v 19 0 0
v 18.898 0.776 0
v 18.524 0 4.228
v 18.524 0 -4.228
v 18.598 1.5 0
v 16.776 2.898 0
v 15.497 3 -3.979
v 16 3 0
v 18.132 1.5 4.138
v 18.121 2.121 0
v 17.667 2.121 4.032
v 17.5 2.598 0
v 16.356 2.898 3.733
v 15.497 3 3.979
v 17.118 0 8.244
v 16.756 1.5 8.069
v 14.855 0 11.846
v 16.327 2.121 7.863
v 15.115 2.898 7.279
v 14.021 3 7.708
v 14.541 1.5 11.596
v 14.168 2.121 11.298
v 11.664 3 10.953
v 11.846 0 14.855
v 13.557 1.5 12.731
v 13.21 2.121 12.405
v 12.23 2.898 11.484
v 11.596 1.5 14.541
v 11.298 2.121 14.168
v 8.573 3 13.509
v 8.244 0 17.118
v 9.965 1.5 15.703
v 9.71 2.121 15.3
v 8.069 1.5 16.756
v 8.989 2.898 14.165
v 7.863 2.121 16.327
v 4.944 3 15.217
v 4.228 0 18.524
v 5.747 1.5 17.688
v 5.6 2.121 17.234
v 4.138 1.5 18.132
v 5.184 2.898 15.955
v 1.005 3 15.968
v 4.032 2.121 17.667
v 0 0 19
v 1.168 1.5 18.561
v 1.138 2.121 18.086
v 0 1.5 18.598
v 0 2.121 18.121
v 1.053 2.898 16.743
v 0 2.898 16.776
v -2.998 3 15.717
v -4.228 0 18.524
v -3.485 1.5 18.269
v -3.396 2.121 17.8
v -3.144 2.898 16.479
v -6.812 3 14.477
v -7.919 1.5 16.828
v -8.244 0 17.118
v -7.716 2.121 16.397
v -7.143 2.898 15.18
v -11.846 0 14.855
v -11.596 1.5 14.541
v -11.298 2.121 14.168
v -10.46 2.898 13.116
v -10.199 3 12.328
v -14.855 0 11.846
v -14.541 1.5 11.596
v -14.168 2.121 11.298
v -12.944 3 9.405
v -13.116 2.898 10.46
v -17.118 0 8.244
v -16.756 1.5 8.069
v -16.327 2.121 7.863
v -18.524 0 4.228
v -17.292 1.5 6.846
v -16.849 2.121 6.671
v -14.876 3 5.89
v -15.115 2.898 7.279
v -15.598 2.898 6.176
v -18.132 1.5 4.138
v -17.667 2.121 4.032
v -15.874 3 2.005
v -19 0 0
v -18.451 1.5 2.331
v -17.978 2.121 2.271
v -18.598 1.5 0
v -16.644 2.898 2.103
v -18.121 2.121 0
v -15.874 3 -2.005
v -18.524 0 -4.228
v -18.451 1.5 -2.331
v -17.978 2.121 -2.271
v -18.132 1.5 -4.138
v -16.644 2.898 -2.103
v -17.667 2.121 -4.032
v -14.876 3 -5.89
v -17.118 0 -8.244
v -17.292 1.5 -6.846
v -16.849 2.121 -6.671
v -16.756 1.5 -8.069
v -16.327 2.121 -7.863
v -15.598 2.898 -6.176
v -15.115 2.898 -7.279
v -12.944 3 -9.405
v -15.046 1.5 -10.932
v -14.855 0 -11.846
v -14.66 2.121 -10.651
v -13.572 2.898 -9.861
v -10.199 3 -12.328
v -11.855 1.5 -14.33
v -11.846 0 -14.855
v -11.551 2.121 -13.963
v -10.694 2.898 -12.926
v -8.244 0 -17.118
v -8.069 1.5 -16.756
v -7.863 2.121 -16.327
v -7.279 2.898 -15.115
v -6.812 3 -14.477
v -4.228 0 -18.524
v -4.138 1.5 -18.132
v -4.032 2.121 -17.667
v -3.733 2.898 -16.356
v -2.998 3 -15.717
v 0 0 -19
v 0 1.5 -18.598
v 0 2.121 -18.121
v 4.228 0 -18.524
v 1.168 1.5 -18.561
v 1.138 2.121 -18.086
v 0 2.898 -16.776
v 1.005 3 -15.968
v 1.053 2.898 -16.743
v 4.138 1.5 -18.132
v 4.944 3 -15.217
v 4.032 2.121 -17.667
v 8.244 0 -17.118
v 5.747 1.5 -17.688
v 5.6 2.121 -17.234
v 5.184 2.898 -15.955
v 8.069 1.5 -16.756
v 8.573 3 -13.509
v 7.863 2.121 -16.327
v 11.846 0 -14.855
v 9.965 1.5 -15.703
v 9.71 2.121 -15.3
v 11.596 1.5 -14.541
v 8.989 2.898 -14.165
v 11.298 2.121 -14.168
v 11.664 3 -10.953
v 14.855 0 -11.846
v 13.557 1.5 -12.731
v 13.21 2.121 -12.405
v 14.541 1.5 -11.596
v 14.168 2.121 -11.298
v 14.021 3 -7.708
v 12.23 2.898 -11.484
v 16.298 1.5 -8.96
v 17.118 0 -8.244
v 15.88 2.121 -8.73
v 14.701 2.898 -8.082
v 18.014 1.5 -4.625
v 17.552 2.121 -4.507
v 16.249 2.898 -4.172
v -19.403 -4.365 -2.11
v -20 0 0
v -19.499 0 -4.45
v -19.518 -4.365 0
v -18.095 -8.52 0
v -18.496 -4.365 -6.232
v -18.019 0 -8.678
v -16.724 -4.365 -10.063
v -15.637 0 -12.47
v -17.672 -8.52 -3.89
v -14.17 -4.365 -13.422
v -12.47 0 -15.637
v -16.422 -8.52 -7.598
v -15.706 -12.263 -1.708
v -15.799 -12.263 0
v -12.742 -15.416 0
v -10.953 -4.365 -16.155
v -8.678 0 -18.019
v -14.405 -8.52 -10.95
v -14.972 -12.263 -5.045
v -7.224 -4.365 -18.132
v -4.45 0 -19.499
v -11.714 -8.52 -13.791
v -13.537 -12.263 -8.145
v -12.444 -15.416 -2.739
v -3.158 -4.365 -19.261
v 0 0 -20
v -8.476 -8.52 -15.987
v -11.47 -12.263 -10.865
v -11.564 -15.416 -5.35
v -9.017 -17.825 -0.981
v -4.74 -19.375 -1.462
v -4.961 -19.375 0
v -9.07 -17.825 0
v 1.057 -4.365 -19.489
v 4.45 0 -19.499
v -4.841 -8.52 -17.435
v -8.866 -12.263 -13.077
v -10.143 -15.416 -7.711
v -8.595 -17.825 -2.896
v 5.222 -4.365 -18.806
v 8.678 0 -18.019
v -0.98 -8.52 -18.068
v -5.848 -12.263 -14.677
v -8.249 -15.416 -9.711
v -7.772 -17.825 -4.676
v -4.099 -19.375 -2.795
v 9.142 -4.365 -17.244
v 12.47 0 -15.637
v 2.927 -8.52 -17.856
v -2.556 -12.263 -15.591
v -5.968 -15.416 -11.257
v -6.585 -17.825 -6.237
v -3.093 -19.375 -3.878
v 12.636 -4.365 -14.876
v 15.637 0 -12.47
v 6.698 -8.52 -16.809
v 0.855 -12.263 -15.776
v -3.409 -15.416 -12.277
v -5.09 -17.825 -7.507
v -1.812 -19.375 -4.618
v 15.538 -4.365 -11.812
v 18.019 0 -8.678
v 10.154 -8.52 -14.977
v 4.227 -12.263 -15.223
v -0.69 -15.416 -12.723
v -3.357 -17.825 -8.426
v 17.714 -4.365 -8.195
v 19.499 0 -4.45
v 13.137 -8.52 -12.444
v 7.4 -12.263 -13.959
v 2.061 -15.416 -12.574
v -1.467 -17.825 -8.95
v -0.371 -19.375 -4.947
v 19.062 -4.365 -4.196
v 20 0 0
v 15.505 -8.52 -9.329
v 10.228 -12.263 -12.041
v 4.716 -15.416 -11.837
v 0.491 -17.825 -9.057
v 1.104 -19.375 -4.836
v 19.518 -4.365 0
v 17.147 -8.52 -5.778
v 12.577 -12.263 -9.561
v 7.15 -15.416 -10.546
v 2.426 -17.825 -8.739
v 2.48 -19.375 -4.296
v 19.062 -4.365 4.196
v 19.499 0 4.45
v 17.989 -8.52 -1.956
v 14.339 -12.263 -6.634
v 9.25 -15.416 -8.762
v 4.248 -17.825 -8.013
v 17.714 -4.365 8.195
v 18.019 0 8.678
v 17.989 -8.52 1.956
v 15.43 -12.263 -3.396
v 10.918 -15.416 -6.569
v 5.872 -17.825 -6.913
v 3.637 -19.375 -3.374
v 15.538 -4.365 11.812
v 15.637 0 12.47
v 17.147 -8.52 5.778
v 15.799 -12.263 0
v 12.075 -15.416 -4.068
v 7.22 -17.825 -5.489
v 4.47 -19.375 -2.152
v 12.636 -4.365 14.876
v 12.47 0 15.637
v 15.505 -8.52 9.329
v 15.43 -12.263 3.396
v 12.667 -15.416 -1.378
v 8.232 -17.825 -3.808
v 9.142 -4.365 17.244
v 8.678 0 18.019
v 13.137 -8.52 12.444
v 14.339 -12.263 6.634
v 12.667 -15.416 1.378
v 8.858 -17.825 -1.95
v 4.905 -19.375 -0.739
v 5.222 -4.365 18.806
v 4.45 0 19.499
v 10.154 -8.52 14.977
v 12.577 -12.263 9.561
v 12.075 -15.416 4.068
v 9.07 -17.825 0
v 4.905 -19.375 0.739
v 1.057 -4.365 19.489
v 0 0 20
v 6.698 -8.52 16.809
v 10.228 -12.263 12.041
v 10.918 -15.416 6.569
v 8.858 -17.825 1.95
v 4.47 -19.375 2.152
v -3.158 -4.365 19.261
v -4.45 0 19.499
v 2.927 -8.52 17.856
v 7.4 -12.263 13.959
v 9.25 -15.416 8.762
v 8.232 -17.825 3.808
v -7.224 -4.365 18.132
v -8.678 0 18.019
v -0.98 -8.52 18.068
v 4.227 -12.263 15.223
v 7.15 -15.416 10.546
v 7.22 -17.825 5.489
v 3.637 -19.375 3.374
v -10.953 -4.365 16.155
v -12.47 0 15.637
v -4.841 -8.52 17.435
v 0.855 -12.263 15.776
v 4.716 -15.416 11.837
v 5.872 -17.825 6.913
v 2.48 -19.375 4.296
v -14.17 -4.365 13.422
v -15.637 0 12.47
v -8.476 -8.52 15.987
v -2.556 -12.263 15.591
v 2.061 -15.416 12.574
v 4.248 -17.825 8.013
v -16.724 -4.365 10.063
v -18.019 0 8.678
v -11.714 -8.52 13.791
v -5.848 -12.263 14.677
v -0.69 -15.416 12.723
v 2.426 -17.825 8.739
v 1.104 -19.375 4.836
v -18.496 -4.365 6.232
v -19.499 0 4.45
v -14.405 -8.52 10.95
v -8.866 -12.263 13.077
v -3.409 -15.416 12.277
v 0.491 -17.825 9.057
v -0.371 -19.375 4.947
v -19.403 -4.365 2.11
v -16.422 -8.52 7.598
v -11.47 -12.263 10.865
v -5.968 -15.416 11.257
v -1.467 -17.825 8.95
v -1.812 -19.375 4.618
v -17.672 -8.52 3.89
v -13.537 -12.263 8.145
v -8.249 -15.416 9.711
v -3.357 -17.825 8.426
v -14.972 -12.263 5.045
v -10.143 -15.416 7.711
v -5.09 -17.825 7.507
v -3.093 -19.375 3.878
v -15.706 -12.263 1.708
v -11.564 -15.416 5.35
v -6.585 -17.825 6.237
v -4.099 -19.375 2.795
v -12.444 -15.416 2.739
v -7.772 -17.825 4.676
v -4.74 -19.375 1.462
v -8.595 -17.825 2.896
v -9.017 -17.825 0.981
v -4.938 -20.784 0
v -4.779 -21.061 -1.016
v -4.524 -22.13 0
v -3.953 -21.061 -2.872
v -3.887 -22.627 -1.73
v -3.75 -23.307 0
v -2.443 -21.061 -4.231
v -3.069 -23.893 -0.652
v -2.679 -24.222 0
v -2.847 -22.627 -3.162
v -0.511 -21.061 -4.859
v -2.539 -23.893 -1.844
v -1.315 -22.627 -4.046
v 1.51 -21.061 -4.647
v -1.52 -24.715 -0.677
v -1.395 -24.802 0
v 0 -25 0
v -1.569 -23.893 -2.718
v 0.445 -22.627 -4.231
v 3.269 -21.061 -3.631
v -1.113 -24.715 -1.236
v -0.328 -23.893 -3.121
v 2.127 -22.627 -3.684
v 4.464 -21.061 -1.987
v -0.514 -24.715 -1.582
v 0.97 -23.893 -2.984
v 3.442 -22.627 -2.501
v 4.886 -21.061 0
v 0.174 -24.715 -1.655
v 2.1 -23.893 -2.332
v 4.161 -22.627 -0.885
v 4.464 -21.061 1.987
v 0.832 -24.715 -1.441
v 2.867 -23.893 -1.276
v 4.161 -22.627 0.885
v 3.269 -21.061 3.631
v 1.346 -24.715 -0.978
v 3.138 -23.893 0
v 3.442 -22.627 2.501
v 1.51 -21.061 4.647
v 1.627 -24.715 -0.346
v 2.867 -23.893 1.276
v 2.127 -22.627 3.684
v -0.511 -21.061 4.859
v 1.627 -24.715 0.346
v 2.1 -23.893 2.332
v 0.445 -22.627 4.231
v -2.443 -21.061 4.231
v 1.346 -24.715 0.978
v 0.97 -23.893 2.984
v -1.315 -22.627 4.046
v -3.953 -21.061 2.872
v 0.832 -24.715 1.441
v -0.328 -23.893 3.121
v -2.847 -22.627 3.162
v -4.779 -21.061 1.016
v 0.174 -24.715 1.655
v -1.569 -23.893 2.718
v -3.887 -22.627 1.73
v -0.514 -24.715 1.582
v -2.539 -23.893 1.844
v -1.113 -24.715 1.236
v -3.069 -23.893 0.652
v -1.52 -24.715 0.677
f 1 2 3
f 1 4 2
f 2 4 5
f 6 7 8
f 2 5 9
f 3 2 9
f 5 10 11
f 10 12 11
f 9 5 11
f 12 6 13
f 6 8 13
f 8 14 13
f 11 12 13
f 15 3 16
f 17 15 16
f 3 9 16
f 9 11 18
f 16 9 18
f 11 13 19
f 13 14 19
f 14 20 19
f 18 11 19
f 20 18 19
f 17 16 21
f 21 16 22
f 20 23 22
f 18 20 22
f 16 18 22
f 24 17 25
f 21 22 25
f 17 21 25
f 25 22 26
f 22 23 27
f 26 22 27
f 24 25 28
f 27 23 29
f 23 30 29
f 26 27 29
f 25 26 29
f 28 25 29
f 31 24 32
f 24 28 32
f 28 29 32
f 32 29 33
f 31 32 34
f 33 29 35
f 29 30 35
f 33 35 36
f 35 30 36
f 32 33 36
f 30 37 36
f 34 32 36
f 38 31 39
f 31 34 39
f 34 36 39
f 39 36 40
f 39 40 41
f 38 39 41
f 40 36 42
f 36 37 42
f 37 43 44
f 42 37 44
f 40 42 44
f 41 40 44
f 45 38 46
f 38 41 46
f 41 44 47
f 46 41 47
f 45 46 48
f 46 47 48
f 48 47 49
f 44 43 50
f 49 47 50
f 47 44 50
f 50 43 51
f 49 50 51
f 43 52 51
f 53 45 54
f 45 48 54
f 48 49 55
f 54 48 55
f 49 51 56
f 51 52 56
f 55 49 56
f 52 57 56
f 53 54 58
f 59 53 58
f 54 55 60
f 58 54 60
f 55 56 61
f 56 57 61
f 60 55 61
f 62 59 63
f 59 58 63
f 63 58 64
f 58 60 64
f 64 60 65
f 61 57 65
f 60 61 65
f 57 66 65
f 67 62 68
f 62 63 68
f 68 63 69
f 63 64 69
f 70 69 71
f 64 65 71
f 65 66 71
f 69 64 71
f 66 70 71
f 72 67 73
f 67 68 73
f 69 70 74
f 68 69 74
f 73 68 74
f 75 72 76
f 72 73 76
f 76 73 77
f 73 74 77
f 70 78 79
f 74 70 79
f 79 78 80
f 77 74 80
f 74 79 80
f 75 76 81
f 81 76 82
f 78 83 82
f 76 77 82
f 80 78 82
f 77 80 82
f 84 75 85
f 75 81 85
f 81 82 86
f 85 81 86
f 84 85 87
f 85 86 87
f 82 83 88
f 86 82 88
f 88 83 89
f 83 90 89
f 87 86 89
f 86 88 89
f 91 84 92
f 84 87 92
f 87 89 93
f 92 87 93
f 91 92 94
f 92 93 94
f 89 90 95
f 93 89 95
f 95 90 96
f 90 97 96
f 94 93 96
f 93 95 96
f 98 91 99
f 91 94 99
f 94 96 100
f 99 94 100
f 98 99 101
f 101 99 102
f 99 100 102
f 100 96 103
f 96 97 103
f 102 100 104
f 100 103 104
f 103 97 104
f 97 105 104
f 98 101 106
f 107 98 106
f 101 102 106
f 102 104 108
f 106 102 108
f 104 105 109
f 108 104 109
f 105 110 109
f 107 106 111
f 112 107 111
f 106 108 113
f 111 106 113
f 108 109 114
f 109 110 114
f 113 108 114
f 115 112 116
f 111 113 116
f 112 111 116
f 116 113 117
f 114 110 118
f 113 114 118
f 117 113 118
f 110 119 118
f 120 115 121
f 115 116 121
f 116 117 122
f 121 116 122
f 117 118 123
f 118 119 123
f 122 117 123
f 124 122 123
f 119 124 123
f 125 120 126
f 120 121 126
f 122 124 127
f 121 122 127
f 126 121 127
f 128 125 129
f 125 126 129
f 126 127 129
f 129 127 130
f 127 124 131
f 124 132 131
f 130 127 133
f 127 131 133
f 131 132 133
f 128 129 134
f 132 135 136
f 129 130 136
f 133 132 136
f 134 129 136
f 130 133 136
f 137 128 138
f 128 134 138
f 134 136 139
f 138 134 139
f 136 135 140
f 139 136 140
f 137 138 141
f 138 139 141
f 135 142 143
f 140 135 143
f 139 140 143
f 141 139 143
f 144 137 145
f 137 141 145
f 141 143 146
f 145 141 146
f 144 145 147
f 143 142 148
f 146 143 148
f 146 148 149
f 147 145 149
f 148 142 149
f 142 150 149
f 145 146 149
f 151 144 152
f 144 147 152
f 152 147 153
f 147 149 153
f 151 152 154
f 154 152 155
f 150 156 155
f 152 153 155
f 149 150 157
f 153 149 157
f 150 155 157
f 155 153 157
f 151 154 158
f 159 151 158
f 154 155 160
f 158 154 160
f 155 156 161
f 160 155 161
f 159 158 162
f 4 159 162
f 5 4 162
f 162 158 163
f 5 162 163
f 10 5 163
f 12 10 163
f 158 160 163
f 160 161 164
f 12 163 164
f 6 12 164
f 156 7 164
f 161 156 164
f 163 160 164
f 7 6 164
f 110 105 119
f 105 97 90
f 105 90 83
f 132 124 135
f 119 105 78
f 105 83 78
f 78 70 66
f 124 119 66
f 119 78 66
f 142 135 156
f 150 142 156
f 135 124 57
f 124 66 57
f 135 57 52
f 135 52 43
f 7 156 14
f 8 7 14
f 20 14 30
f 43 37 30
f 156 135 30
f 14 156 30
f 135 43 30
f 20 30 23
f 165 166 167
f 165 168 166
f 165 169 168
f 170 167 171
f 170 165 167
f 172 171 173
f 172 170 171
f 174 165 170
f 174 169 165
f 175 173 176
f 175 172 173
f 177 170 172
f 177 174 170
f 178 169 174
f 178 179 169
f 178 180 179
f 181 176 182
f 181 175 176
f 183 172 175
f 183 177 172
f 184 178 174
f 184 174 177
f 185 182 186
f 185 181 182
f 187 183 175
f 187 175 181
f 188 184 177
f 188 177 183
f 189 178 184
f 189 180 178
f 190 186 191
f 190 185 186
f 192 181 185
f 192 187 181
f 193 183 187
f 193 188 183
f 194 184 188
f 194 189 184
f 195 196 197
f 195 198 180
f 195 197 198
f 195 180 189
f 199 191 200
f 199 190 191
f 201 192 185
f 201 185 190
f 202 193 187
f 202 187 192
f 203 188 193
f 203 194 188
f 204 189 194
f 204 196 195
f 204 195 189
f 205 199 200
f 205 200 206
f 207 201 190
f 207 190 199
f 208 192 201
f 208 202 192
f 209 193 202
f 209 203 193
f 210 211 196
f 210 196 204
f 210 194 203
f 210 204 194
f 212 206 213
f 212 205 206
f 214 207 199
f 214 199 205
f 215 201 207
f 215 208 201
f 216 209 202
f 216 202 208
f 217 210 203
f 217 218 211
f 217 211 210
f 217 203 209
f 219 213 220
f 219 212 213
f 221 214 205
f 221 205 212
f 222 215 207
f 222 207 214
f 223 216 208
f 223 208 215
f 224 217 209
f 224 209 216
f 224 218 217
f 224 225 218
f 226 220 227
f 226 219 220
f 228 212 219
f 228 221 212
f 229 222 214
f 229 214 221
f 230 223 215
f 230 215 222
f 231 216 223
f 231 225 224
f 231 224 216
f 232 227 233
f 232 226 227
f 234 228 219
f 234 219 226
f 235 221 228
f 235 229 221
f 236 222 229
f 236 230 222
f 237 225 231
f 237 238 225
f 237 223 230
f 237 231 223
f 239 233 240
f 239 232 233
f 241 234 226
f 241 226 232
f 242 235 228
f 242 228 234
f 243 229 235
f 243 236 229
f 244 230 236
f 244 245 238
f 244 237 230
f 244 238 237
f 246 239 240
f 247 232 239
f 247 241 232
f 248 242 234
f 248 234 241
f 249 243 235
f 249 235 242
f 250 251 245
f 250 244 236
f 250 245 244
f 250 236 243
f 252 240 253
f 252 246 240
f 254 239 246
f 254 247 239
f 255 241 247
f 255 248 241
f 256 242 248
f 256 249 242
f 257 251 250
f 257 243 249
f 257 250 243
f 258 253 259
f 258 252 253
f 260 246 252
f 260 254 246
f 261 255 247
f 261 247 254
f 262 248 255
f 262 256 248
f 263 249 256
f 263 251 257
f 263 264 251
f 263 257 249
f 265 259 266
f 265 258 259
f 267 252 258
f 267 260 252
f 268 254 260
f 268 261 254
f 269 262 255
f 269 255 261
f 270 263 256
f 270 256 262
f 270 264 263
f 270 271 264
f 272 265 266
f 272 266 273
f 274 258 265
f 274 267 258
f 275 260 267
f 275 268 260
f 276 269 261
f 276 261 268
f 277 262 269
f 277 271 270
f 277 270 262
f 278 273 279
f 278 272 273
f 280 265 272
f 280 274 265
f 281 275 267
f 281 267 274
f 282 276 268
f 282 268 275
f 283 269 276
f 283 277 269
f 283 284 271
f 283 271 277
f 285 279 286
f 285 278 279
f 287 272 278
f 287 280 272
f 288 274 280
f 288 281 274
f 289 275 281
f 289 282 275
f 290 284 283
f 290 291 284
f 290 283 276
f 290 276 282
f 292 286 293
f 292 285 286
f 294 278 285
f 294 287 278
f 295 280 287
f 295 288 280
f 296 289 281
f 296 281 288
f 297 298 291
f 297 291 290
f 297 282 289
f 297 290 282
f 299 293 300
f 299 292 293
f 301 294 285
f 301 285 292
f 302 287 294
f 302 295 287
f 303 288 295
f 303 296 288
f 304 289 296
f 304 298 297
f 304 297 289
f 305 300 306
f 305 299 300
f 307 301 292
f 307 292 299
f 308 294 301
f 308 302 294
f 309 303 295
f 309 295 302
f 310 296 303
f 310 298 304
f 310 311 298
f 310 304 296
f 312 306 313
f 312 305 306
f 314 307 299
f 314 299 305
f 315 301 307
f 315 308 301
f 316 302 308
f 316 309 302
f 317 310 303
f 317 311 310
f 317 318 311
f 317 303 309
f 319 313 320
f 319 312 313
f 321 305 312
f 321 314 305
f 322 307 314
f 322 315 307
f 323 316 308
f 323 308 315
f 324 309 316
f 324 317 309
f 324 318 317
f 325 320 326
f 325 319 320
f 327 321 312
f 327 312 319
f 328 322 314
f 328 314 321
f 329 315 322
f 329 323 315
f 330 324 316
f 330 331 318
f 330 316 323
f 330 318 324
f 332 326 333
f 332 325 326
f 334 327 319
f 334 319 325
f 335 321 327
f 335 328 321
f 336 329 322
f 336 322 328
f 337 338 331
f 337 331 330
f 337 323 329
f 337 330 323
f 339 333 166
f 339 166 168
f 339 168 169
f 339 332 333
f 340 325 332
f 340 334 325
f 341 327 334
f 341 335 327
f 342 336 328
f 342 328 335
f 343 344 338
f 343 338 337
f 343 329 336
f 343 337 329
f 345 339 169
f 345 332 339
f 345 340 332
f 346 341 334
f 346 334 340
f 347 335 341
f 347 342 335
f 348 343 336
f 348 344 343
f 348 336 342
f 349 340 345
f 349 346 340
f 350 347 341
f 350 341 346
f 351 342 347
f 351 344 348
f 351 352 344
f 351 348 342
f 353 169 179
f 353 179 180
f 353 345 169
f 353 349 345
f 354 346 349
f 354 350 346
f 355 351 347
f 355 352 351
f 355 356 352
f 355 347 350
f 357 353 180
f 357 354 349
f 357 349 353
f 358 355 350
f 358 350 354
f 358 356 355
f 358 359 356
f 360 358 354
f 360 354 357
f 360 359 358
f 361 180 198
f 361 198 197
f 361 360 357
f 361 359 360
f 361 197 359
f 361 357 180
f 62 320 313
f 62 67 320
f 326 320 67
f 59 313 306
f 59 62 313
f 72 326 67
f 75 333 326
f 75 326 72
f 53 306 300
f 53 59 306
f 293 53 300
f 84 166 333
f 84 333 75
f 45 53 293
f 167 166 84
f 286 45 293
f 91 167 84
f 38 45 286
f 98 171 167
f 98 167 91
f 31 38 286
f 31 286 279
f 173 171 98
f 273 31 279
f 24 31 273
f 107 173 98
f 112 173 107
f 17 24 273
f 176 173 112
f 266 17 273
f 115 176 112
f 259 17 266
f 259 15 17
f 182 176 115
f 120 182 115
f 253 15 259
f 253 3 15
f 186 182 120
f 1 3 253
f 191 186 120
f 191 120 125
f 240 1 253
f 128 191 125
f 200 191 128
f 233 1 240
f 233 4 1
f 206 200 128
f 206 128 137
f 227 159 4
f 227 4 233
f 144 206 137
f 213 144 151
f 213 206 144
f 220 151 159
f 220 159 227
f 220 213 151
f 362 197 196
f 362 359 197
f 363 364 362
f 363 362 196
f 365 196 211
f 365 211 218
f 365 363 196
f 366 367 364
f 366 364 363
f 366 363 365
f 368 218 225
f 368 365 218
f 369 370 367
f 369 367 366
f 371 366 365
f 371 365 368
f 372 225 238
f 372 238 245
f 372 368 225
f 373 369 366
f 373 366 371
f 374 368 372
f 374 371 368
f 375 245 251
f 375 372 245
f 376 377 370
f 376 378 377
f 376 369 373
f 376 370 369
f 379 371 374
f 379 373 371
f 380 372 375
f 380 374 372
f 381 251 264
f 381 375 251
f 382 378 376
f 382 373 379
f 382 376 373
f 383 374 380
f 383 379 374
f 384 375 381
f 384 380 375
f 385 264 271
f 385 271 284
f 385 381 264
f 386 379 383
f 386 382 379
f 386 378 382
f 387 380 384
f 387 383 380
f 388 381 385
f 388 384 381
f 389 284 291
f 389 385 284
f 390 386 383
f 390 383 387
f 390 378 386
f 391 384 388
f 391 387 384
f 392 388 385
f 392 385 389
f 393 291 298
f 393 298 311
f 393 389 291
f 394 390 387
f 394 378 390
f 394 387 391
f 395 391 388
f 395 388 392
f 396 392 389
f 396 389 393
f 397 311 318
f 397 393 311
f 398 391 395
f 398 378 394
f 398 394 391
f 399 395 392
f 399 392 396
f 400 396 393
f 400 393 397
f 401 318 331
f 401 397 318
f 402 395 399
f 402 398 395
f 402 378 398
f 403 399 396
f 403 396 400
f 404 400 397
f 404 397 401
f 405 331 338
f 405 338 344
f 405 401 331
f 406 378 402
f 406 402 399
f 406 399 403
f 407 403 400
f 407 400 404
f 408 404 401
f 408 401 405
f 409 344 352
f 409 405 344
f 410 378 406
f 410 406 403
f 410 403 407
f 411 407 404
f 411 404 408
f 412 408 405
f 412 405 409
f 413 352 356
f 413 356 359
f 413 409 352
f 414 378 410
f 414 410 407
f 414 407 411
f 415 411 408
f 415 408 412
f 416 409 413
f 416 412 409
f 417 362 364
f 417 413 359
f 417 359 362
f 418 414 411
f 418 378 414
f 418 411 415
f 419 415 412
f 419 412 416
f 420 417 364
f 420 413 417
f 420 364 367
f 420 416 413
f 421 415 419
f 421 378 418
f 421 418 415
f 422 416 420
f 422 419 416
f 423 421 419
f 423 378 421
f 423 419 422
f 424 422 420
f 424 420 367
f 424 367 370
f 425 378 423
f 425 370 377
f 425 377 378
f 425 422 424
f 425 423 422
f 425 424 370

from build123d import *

# Parameters (mm, degrees)
F2_R     = 19
F3_DEPTH = 3
F4_R     = 2.99999


# Not quite as in the source:
# - a fillet or chamfer is up to 0.001 mm smaller than in the source, because OpenCascade refuses the exact size


with BuildPart() as f1:
    # F0 (on Top) → F1 (revolve)
    with BuildSketch(Plane.XY):
        with BuildLine():
            Line((0, 0), (-20, 0))
            ThreePointArc((-20, 0), (-15.7989821534, -12.2634482474), (-4.9607837082, -19.375))
            ThreePointArc((-4.9607837082, -19.375), (-3.75, -23.3071891388), (0, -25))
            Line((0, -25), (0, -20))
            Line((0, -20), (0, 0))
        make_face()
    revolve(axis=Axis((0, -10, 0), (0, -1, 0)))

    # F2 (on Front) → F3 (join)
    with BuildSketch(Plane.XZ):
        Circle(F2_R)
    extrude(amount=-F3_DEPTH)

    # F4 (radius 3 in the source; OpenCascade refuses exactly that, so slightly less here)
    f4_edges = [f1.edges().sort_by_distance(p)[0] for p in [
        (-19, 3, 0),
    ]]
    fillet(f4_edges, radius=F4_R)


solid = f1.part
